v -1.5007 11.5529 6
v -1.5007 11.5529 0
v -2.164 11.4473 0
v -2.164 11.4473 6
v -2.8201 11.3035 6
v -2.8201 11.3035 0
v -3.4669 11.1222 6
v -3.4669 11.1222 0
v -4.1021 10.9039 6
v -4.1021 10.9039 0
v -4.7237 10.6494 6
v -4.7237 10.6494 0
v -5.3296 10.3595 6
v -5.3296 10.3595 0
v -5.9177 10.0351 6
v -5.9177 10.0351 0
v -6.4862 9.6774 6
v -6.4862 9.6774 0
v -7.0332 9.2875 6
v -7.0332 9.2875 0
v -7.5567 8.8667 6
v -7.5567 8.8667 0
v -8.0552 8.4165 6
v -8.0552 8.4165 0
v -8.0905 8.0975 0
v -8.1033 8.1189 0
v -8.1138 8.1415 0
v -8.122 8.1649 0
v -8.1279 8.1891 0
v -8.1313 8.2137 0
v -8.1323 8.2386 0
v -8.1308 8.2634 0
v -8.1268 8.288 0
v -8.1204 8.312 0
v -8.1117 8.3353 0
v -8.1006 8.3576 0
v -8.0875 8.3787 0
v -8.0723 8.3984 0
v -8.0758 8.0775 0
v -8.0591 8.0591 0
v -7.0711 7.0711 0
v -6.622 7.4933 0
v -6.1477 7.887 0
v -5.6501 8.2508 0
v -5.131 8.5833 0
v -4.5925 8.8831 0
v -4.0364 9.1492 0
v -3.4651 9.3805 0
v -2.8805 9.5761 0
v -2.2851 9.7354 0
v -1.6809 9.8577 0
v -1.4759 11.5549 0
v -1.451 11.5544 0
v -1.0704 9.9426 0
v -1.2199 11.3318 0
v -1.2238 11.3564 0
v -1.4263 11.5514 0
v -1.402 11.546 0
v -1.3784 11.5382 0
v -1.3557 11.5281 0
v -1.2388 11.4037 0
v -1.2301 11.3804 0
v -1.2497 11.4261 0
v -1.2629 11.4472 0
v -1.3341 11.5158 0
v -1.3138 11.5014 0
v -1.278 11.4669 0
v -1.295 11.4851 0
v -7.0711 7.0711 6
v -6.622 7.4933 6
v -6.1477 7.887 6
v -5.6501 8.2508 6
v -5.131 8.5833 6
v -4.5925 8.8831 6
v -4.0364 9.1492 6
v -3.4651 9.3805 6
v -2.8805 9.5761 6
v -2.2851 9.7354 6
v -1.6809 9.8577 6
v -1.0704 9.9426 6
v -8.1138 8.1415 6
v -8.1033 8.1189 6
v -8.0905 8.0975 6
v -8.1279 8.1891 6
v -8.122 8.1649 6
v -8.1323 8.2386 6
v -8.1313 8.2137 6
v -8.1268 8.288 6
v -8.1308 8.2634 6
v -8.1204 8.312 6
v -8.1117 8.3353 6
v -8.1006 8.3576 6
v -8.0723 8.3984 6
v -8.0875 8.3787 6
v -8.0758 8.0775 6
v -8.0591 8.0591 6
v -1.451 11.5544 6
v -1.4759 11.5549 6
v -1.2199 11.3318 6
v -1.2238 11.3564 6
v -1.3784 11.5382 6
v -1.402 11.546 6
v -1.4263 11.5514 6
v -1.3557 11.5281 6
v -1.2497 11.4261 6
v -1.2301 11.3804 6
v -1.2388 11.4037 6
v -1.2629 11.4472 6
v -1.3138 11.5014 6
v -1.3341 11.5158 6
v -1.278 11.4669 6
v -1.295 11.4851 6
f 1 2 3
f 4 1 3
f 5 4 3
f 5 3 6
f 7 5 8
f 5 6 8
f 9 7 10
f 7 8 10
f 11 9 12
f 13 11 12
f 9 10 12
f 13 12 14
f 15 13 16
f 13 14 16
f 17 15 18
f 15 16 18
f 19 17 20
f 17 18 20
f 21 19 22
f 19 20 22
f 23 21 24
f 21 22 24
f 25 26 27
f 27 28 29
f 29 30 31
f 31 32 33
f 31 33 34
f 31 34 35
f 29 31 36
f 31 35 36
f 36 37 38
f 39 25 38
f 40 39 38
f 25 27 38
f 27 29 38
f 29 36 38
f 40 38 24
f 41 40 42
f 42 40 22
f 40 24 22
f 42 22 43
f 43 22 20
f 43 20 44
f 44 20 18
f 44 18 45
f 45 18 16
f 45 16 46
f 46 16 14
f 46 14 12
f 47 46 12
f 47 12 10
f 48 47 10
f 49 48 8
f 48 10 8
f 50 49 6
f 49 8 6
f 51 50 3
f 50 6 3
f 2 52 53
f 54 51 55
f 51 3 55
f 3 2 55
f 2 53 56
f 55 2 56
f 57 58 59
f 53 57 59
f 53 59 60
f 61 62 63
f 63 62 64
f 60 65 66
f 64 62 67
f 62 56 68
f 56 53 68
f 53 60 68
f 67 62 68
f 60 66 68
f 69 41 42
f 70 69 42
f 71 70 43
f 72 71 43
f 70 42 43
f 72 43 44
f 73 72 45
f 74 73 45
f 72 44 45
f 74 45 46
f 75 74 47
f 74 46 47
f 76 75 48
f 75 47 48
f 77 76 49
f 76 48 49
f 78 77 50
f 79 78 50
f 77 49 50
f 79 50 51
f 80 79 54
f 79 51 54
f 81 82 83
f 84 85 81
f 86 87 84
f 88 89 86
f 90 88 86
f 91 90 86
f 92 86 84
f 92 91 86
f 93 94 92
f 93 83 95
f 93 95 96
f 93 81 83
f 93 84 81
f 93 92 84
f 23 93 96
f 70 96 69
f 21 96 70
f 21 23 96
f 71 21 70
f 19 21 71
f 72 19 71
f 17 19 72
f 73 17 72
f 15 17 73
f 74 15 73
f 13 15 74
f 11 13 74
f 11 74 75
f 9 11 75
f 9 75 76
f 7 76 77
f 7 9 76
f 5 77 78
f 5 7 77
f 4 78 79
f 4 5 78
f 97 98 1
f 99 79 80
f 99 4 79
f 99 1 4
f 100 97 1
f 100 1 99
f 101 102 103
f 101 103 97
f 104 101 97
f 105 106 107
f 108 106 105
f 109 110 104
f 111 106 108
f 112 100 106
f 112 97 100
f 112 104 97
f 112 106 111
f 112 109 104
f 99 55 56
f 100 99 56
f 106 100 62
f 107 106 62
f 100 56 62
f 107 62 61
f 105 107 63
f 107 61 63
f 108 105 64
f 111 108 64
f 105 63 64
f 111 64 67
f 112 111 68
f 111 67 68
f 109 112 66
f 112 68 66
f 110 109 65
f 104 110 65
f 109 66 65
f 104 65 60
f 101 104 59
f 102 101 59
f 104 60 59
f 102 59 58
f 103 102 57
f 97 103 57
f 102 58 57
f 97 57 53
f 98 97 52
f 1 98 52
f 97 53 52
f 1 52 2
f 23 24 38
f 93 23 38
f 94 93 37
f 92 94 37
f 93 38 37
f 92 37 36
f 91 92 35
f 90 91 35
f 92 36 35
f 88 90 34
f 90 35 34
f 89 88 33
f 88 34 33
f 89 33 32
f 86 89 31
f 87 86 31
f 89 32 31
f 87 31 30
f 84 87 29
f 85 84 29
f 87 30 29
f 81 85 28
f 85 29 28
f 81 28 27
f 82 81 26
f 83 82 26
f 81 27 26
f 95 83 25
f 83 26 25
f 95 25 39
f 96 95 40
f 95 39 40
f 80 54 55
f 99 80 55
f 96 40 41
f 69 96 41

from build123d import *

# Parameters (mm, degrees)
F1_DEPTH = 6


with BuildPart() as f1:
    # F0 (on Top) → F1 (new body)
    with BuildSketch(Plane.XY):
        with BuildLine():
            ThreePointArc((-8.05516, 8.416466), (-8.132287, 8.238597), (-8.059079, 8.059079))
            Line((-8.059079, 8.059079), (-7.071068, 7.071068))
            ThreePointArc((-7.071068, 7.071068), (-4.316488, 9.020417), (-1.070361, 9.942551))
            Line((-1.070361, 9.942551), (-1.219918, 11.331783))
            ThreePointArc((-1.219918, 11.331783), (-1.313786, 11.501414), (-1.500685, 11.552941))
            ThreePointArc((-1.500685, 11.552941), (-5.028709, 10.508786), (-8.05516, 8.416466))
        make_face()
    extrude(amount=F1_DEPTH)


solid = f1.part
